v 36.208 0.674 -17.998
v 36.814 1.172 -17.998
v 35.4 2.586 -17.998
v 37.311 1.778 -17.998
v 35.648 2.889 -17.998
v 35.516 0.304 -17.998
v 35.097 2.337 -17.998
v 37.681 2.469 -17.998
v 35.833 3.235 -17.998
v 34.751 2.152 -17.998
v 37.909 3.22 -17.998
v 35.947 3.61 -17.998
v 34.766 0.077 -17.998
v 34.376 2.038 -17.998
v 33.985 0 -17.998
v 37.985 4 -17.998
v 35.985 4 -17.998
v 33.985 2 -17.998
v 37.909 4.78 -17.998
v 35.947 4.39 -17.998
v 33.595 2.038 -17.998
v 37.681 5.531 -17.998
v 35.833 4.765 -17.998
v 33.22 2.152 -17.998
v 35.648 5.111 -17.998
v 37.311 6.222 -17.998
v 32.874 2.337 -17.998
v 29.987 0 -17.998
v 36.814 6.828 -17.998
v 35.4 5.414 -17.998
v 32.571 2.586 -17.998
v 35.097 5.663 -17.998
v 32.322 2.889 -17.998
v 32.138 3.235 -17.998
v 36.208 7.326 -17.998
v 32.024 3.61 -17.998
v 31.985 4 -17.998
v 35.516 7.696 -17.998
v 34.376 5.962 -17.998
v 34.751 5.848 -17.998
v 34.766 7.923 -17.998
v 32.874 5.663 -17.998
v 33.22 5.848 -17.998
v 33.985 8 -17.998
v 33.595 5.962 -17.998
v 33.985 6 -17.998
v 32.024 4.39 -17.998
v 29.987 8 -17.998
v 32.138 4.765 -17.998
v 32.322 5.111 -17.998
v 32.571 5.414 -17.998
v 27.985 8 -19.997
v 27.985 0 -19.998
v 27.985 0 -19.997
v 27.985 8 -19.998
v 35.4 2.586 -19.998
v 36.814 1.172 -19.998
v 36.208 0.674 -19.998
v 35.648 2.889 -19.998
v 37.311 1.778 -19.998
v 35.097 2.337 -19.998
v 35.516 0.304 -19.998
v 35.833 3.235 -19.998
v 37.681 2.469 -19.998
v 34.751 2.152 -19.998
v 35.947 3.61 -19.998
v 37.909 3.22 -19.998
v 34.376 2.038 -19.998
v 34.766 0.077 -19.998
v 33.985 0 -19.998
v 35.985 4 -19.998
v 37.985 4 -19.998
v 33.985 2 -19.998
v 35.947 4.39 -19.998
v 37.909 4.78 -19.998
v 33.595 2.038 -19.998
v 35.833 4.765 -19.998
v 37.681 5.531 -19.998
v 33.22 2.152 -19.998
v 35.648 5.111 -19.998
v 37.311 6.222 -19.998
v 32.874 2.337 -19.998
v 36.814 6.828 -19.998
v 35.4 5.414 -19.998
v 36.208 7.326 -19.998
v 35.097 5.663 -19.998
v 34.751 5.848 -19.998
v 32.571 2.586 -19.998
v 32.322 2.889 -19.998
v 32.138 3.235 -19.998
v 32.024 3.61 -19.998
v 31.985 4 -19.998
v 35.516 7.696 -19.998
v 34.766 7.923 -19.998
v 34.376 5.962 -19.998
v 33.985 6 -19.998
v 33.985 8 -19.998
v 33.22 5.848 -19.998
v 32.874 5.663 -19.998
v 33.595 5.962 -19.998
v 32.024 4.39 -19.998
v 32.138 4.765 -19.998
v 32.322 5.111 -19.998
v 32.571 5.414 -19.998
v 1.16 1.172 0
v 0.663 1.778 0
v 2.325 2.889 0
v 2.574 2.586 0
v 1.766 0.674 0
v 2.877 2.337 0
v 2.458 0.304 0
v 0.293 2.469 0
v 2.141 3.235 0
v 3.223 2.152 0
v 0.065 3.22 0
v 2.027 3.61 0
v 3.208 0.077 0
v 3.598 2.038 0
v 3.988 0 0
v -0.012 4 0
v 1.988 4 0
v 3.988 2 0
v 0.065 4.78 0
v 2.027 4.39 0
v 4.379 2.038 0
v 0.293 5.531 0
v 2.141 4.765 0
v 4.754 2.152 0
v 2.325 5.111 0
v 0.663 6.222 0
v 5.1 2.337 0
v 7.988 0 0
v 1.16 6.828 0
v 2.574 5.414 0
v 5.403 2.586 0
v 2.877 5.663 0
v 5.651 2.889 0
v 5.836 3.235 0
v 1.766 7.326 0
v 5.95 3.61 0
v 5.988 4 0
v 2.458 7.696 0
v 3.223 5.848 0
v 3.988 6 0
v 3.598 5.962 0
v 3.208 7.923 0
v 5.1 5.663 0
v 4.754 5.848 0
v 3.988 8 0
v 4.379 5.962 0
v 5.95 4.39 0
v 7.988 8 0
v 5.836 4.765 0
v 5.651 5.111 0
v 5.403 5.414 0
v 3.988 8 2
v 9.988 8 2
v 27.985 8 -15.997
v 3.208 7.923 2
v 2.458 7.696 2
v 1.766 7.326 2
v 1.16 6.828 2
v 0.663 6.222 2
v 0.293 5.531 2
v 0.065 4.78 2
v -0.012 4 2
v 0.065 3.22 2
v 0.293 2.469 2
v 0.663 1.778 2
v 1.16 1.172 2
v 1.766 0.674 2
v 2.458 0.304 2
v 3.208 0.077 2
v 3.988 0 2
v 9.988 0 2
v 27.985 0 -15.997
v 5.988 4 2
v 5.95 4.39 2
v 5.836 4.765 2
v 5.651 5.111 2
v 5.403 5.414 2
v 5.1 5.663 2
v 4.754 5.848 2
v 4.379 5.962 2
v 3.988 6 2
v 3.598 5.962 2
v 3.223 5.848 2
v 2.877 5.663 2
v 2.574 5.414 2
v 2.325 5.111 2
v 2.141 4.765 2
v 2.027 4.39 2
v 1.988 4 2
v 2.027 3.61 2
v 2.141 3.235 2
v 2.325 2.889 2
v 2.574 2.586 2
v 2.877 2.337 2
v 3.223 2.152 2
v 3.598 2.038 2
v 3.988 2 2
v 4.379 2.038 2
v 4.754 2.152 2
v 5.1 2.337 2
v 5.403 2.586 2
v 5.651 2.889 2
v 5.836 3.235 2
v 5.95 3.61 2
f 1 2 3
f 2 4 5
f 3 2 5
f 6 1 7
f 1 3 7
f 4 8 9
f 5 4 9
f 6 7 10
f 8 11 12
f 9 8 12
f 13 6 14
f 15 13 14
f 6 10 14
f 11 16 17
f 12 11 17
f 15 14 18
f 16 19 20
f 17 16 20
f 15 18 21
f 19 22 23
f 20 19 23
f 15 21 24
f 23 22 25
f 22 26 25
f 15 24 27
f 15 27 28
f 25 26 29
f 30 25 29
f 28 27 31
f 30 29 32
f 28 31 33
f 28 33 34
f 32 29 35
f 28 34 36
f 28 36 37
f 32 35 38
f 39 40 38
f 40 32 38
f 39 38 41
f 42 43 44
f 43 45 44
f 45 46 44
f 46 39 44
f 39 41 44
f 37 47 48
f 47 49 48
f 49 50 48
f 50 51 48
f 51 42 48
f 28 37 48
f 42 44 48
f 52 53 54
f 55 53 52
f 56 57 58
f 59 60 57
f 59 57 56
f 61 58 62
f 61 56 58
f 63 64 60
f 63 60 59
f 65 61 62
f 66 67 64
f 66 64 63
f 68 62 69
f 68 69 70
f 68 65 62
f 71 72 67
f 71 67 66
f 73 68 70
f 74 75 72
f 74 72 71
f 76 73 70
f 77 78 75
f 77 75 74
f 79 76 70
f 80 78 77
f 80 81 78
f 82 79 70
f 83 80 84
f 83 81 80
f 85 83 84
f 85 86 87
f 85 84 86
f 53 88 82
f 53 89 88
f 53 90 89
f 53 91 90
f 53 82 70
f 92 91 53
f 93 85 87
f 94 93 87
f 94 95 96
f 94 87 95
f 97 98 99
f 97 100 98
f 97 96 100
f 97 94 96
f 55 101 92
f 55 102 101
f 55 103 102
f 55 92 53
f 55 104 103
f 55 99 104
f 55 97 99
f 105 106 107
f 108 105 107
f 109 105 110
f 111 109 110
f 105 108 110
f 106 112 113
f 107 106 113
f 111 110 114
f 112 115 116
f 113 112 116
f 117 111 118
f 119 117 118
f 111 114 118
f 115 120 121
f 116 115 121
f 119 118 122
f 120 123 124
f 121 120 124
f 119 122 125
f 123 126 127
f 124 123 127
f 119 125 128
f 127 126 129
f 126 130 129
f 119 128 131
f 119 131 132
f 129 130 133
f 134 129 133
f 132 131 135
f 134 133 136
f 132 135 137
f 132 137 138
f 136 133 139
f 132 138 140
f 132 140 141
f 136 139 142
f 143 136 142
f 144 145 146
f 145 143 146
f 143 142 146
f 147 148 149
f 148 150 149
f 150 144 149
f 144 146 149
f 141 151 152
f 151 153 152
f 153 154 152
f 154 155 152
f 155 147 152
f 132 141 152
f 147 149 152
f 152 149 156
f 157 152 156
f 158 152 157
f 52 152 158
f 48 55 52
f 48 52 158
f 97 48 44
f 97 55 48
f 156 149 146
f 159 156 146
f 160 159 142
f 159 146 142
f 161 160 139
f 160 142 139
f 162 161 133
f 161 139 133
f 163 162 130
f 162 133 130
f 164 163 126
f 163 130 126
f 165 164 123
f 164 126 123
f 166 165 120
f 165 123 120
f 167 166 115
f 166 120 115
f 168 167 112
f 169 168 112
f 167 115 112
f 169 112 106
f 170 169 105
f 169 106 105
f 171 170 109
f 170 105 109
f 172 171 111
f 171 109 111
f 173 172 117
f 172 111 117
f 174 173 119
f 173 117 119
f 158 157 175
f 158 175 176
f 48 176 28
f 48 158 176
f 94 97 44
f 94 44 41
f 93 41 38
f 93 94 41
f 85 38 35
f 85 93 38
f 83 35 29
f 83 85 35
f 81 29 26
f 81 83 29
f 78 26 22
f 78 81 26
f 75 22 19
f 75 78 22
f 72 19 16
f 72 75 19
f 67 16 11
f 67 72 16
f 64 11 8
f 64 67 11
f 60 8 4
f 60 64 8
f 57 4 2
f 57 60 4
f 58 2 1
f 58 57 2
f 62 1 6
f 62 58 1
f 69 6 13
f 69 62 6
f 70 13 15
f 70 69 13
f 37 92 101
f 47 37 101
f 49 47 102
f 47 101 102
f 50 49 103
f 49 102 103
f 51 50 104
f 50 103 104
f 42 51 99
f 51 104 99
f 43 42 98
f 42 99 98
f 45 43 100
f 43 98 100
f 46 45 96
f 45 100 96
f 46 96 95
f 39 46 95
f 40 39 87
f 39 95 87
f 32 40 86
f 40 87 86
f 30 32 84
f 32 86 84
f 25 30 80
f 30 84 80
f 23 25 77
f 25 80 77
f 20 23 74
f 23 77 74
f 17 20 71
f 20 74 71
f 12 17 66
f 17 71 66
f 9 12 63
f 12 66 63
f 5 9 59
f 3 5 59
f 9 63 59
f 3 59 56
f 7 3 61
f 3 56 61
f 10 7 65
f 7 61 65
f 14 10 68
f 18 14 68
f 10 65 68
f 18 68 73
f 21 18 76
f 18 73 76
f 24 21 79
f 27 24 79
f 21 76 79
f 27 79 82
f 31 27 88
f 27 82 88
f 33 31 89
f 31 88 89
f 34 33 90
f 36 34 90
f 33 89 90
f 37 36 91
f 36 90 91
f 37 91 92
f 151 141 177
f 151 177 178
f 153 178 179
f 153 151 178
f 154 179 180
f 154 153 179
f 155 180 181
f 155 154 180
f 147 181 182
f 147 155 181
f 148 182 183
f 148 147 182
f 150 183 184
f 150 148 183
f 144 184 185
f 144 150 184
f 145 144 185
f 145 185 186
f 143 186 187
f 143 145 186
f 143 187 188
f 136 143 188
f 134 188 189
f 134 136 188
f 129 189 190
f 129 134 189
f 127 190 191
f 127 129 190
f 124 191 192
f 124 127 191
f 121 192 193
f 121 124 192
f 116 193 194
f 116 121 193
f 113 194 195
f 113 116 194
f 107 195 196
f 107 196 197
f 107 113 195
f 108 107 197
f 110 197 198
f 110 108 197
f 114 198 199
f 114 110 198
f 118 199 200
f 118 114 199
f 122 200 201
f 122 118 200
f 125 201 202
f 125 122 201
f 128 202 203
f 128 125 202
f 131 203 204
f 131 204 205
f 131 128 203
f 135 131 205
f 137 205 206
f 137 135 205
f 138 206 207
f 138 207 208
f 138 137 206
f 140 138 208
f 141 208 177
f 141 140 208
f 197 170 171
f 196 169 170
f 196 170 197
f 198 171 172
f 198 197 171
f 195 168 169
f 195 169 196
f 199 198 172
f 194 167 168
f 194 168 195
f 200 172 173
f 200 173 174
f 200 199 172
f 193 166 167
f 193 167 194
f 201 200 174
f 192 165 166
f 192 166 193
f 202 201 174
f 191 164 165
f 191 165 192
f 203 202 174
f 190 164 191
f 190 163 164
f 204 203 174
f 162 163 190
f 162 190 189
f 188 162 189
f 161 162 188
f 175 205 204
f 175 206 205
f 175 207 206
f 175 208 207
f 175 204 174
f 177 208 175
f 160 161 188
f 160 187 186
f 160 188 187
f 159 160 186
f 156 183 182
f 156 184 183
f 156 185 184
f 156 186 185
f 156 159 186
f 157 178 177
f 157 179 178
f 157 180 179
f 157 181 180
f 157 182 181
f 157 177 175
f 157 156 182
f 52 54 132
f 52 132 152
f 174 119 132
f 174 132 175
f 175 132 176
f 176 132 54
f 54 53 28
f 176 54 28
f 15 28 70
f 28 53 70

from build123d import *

# Parameters (mm, degrees)
SKETCH_1_R          = 2
EXTRUDE_1_DEPTH     = 2
CUT_EXTRUDE_1_DEPTH = 13.952524728
SKETCH_4_W          = 2.828427125
SKETCH_4_H          = 8
EXTRUDE_2_DEPTH     = 28.28
CUT_EXTRUDE_2_DEPTH = 37.918850015
SKETCH_7_R          = 2
EXTRUDE_3_DEPTH     = 2
EXTRUDE_4_DEPTH     = 8


with BuildPart() as part:
    # 草图1 → 凸台-拉伸1 (new body)
    with BuildSketch(Plane.XY):
        with BuildLine():
            Line((3.9883881, 0), (9.9883881, 0))
            Line((9.9883881, 0), (9.9883881, 8))
            Line((9.9883881, 8), (3.9883881, 8))
            ThreePointArc((3.9883881, 8), (-0.0116119, 4), (3.9883881, 0))
        make_face()
        with Locations((3.9883881, 4)):
            Circle(SKETCH_1_R, mode=Mode.SUBTRACT)
    extrude(amount=EXTRUDE_1_DEPTH)

    # 草图2 → 切除-拉伸1 (cut, through all)
    with BuildSketch(Plane.XZ):
        Polygon((9.9883881, 2), (7.9883881, 0), (9.9883881, 0), align=None)
    extrude(amount=-CUT_EXTRUDE_1_DEPTH, mode=Mode.SUBTRACT)

    # 草图4 → 凸台-拉伸2 (add)
    with BuildSketch(Plane(origin=(3.99419405, 0, -3.99419405), x_dir=(-0.7071067811865488, 0, -0.7071067811865462), z_dir=(0.7071067811865462, 0, -0.7071067811865488))):
        with Locations((-7.062856959, 4)):
            Rectangle(SKETCH_4_W, SKETCH_4_H)
    extrude(amount=EXTRUDE_2_DEPTH)

    # 草图5 → 切除-拉伸2 (cut, through all)
    with BuildSketch(Plane(origin=(0, 8, 0), x_dir=(1, 0, 0), z_dir=(0, 1, 0))):
        Polygon((27.985367872, 19.996979772), (27.985367872, 15.996979772), (29.985367872, 17.996979772), align=None)
    extrude(amount=-CUT_EXTRUDE_2_DEPTH, mode=Mode.SUBTRACT)

    # 草图7 → 凸台-拉伸3 (add)
    with BuildSketch(Plane(origin=(0, 0, -19.998489886), x_dir=(-1, 0, 0), z_dir=(0, 0, -1))):
        with BuildLine():
            Line((-27.985367872, 8), (-33.985367872, 8))
            ThreePointArc((-33.985367872, 8), (-37.985367872, 4), (-33.985367872, 0))
            Line((-33.985367872, 0), (-27.985367872, 0))
            Line((-27.985367872, 0), (-27.985367872, 8))
        make_face()
        with Locations((-33.985367872, 4)):
            Circle(SKETCH_7_R, mode=Mode.SUBTRACT)
    extrude(amount=-EXTRUDE_3_DEPTH)

    # 草图8 → 凸台-拉伸4 (add)
    with BuildSketch(Plane(origin=(0, 8, 0), x_dir=(1, 0, 0), z_dir=(0, 1, 0))):
        Polygon((27.985367872, 15.996979772), (29.986877986, 17.998489886), (27.985367872, 17.998489886), align=None)
    extrude(amount=-EXTRUDE_4_DEPTH)


solid = part.part
